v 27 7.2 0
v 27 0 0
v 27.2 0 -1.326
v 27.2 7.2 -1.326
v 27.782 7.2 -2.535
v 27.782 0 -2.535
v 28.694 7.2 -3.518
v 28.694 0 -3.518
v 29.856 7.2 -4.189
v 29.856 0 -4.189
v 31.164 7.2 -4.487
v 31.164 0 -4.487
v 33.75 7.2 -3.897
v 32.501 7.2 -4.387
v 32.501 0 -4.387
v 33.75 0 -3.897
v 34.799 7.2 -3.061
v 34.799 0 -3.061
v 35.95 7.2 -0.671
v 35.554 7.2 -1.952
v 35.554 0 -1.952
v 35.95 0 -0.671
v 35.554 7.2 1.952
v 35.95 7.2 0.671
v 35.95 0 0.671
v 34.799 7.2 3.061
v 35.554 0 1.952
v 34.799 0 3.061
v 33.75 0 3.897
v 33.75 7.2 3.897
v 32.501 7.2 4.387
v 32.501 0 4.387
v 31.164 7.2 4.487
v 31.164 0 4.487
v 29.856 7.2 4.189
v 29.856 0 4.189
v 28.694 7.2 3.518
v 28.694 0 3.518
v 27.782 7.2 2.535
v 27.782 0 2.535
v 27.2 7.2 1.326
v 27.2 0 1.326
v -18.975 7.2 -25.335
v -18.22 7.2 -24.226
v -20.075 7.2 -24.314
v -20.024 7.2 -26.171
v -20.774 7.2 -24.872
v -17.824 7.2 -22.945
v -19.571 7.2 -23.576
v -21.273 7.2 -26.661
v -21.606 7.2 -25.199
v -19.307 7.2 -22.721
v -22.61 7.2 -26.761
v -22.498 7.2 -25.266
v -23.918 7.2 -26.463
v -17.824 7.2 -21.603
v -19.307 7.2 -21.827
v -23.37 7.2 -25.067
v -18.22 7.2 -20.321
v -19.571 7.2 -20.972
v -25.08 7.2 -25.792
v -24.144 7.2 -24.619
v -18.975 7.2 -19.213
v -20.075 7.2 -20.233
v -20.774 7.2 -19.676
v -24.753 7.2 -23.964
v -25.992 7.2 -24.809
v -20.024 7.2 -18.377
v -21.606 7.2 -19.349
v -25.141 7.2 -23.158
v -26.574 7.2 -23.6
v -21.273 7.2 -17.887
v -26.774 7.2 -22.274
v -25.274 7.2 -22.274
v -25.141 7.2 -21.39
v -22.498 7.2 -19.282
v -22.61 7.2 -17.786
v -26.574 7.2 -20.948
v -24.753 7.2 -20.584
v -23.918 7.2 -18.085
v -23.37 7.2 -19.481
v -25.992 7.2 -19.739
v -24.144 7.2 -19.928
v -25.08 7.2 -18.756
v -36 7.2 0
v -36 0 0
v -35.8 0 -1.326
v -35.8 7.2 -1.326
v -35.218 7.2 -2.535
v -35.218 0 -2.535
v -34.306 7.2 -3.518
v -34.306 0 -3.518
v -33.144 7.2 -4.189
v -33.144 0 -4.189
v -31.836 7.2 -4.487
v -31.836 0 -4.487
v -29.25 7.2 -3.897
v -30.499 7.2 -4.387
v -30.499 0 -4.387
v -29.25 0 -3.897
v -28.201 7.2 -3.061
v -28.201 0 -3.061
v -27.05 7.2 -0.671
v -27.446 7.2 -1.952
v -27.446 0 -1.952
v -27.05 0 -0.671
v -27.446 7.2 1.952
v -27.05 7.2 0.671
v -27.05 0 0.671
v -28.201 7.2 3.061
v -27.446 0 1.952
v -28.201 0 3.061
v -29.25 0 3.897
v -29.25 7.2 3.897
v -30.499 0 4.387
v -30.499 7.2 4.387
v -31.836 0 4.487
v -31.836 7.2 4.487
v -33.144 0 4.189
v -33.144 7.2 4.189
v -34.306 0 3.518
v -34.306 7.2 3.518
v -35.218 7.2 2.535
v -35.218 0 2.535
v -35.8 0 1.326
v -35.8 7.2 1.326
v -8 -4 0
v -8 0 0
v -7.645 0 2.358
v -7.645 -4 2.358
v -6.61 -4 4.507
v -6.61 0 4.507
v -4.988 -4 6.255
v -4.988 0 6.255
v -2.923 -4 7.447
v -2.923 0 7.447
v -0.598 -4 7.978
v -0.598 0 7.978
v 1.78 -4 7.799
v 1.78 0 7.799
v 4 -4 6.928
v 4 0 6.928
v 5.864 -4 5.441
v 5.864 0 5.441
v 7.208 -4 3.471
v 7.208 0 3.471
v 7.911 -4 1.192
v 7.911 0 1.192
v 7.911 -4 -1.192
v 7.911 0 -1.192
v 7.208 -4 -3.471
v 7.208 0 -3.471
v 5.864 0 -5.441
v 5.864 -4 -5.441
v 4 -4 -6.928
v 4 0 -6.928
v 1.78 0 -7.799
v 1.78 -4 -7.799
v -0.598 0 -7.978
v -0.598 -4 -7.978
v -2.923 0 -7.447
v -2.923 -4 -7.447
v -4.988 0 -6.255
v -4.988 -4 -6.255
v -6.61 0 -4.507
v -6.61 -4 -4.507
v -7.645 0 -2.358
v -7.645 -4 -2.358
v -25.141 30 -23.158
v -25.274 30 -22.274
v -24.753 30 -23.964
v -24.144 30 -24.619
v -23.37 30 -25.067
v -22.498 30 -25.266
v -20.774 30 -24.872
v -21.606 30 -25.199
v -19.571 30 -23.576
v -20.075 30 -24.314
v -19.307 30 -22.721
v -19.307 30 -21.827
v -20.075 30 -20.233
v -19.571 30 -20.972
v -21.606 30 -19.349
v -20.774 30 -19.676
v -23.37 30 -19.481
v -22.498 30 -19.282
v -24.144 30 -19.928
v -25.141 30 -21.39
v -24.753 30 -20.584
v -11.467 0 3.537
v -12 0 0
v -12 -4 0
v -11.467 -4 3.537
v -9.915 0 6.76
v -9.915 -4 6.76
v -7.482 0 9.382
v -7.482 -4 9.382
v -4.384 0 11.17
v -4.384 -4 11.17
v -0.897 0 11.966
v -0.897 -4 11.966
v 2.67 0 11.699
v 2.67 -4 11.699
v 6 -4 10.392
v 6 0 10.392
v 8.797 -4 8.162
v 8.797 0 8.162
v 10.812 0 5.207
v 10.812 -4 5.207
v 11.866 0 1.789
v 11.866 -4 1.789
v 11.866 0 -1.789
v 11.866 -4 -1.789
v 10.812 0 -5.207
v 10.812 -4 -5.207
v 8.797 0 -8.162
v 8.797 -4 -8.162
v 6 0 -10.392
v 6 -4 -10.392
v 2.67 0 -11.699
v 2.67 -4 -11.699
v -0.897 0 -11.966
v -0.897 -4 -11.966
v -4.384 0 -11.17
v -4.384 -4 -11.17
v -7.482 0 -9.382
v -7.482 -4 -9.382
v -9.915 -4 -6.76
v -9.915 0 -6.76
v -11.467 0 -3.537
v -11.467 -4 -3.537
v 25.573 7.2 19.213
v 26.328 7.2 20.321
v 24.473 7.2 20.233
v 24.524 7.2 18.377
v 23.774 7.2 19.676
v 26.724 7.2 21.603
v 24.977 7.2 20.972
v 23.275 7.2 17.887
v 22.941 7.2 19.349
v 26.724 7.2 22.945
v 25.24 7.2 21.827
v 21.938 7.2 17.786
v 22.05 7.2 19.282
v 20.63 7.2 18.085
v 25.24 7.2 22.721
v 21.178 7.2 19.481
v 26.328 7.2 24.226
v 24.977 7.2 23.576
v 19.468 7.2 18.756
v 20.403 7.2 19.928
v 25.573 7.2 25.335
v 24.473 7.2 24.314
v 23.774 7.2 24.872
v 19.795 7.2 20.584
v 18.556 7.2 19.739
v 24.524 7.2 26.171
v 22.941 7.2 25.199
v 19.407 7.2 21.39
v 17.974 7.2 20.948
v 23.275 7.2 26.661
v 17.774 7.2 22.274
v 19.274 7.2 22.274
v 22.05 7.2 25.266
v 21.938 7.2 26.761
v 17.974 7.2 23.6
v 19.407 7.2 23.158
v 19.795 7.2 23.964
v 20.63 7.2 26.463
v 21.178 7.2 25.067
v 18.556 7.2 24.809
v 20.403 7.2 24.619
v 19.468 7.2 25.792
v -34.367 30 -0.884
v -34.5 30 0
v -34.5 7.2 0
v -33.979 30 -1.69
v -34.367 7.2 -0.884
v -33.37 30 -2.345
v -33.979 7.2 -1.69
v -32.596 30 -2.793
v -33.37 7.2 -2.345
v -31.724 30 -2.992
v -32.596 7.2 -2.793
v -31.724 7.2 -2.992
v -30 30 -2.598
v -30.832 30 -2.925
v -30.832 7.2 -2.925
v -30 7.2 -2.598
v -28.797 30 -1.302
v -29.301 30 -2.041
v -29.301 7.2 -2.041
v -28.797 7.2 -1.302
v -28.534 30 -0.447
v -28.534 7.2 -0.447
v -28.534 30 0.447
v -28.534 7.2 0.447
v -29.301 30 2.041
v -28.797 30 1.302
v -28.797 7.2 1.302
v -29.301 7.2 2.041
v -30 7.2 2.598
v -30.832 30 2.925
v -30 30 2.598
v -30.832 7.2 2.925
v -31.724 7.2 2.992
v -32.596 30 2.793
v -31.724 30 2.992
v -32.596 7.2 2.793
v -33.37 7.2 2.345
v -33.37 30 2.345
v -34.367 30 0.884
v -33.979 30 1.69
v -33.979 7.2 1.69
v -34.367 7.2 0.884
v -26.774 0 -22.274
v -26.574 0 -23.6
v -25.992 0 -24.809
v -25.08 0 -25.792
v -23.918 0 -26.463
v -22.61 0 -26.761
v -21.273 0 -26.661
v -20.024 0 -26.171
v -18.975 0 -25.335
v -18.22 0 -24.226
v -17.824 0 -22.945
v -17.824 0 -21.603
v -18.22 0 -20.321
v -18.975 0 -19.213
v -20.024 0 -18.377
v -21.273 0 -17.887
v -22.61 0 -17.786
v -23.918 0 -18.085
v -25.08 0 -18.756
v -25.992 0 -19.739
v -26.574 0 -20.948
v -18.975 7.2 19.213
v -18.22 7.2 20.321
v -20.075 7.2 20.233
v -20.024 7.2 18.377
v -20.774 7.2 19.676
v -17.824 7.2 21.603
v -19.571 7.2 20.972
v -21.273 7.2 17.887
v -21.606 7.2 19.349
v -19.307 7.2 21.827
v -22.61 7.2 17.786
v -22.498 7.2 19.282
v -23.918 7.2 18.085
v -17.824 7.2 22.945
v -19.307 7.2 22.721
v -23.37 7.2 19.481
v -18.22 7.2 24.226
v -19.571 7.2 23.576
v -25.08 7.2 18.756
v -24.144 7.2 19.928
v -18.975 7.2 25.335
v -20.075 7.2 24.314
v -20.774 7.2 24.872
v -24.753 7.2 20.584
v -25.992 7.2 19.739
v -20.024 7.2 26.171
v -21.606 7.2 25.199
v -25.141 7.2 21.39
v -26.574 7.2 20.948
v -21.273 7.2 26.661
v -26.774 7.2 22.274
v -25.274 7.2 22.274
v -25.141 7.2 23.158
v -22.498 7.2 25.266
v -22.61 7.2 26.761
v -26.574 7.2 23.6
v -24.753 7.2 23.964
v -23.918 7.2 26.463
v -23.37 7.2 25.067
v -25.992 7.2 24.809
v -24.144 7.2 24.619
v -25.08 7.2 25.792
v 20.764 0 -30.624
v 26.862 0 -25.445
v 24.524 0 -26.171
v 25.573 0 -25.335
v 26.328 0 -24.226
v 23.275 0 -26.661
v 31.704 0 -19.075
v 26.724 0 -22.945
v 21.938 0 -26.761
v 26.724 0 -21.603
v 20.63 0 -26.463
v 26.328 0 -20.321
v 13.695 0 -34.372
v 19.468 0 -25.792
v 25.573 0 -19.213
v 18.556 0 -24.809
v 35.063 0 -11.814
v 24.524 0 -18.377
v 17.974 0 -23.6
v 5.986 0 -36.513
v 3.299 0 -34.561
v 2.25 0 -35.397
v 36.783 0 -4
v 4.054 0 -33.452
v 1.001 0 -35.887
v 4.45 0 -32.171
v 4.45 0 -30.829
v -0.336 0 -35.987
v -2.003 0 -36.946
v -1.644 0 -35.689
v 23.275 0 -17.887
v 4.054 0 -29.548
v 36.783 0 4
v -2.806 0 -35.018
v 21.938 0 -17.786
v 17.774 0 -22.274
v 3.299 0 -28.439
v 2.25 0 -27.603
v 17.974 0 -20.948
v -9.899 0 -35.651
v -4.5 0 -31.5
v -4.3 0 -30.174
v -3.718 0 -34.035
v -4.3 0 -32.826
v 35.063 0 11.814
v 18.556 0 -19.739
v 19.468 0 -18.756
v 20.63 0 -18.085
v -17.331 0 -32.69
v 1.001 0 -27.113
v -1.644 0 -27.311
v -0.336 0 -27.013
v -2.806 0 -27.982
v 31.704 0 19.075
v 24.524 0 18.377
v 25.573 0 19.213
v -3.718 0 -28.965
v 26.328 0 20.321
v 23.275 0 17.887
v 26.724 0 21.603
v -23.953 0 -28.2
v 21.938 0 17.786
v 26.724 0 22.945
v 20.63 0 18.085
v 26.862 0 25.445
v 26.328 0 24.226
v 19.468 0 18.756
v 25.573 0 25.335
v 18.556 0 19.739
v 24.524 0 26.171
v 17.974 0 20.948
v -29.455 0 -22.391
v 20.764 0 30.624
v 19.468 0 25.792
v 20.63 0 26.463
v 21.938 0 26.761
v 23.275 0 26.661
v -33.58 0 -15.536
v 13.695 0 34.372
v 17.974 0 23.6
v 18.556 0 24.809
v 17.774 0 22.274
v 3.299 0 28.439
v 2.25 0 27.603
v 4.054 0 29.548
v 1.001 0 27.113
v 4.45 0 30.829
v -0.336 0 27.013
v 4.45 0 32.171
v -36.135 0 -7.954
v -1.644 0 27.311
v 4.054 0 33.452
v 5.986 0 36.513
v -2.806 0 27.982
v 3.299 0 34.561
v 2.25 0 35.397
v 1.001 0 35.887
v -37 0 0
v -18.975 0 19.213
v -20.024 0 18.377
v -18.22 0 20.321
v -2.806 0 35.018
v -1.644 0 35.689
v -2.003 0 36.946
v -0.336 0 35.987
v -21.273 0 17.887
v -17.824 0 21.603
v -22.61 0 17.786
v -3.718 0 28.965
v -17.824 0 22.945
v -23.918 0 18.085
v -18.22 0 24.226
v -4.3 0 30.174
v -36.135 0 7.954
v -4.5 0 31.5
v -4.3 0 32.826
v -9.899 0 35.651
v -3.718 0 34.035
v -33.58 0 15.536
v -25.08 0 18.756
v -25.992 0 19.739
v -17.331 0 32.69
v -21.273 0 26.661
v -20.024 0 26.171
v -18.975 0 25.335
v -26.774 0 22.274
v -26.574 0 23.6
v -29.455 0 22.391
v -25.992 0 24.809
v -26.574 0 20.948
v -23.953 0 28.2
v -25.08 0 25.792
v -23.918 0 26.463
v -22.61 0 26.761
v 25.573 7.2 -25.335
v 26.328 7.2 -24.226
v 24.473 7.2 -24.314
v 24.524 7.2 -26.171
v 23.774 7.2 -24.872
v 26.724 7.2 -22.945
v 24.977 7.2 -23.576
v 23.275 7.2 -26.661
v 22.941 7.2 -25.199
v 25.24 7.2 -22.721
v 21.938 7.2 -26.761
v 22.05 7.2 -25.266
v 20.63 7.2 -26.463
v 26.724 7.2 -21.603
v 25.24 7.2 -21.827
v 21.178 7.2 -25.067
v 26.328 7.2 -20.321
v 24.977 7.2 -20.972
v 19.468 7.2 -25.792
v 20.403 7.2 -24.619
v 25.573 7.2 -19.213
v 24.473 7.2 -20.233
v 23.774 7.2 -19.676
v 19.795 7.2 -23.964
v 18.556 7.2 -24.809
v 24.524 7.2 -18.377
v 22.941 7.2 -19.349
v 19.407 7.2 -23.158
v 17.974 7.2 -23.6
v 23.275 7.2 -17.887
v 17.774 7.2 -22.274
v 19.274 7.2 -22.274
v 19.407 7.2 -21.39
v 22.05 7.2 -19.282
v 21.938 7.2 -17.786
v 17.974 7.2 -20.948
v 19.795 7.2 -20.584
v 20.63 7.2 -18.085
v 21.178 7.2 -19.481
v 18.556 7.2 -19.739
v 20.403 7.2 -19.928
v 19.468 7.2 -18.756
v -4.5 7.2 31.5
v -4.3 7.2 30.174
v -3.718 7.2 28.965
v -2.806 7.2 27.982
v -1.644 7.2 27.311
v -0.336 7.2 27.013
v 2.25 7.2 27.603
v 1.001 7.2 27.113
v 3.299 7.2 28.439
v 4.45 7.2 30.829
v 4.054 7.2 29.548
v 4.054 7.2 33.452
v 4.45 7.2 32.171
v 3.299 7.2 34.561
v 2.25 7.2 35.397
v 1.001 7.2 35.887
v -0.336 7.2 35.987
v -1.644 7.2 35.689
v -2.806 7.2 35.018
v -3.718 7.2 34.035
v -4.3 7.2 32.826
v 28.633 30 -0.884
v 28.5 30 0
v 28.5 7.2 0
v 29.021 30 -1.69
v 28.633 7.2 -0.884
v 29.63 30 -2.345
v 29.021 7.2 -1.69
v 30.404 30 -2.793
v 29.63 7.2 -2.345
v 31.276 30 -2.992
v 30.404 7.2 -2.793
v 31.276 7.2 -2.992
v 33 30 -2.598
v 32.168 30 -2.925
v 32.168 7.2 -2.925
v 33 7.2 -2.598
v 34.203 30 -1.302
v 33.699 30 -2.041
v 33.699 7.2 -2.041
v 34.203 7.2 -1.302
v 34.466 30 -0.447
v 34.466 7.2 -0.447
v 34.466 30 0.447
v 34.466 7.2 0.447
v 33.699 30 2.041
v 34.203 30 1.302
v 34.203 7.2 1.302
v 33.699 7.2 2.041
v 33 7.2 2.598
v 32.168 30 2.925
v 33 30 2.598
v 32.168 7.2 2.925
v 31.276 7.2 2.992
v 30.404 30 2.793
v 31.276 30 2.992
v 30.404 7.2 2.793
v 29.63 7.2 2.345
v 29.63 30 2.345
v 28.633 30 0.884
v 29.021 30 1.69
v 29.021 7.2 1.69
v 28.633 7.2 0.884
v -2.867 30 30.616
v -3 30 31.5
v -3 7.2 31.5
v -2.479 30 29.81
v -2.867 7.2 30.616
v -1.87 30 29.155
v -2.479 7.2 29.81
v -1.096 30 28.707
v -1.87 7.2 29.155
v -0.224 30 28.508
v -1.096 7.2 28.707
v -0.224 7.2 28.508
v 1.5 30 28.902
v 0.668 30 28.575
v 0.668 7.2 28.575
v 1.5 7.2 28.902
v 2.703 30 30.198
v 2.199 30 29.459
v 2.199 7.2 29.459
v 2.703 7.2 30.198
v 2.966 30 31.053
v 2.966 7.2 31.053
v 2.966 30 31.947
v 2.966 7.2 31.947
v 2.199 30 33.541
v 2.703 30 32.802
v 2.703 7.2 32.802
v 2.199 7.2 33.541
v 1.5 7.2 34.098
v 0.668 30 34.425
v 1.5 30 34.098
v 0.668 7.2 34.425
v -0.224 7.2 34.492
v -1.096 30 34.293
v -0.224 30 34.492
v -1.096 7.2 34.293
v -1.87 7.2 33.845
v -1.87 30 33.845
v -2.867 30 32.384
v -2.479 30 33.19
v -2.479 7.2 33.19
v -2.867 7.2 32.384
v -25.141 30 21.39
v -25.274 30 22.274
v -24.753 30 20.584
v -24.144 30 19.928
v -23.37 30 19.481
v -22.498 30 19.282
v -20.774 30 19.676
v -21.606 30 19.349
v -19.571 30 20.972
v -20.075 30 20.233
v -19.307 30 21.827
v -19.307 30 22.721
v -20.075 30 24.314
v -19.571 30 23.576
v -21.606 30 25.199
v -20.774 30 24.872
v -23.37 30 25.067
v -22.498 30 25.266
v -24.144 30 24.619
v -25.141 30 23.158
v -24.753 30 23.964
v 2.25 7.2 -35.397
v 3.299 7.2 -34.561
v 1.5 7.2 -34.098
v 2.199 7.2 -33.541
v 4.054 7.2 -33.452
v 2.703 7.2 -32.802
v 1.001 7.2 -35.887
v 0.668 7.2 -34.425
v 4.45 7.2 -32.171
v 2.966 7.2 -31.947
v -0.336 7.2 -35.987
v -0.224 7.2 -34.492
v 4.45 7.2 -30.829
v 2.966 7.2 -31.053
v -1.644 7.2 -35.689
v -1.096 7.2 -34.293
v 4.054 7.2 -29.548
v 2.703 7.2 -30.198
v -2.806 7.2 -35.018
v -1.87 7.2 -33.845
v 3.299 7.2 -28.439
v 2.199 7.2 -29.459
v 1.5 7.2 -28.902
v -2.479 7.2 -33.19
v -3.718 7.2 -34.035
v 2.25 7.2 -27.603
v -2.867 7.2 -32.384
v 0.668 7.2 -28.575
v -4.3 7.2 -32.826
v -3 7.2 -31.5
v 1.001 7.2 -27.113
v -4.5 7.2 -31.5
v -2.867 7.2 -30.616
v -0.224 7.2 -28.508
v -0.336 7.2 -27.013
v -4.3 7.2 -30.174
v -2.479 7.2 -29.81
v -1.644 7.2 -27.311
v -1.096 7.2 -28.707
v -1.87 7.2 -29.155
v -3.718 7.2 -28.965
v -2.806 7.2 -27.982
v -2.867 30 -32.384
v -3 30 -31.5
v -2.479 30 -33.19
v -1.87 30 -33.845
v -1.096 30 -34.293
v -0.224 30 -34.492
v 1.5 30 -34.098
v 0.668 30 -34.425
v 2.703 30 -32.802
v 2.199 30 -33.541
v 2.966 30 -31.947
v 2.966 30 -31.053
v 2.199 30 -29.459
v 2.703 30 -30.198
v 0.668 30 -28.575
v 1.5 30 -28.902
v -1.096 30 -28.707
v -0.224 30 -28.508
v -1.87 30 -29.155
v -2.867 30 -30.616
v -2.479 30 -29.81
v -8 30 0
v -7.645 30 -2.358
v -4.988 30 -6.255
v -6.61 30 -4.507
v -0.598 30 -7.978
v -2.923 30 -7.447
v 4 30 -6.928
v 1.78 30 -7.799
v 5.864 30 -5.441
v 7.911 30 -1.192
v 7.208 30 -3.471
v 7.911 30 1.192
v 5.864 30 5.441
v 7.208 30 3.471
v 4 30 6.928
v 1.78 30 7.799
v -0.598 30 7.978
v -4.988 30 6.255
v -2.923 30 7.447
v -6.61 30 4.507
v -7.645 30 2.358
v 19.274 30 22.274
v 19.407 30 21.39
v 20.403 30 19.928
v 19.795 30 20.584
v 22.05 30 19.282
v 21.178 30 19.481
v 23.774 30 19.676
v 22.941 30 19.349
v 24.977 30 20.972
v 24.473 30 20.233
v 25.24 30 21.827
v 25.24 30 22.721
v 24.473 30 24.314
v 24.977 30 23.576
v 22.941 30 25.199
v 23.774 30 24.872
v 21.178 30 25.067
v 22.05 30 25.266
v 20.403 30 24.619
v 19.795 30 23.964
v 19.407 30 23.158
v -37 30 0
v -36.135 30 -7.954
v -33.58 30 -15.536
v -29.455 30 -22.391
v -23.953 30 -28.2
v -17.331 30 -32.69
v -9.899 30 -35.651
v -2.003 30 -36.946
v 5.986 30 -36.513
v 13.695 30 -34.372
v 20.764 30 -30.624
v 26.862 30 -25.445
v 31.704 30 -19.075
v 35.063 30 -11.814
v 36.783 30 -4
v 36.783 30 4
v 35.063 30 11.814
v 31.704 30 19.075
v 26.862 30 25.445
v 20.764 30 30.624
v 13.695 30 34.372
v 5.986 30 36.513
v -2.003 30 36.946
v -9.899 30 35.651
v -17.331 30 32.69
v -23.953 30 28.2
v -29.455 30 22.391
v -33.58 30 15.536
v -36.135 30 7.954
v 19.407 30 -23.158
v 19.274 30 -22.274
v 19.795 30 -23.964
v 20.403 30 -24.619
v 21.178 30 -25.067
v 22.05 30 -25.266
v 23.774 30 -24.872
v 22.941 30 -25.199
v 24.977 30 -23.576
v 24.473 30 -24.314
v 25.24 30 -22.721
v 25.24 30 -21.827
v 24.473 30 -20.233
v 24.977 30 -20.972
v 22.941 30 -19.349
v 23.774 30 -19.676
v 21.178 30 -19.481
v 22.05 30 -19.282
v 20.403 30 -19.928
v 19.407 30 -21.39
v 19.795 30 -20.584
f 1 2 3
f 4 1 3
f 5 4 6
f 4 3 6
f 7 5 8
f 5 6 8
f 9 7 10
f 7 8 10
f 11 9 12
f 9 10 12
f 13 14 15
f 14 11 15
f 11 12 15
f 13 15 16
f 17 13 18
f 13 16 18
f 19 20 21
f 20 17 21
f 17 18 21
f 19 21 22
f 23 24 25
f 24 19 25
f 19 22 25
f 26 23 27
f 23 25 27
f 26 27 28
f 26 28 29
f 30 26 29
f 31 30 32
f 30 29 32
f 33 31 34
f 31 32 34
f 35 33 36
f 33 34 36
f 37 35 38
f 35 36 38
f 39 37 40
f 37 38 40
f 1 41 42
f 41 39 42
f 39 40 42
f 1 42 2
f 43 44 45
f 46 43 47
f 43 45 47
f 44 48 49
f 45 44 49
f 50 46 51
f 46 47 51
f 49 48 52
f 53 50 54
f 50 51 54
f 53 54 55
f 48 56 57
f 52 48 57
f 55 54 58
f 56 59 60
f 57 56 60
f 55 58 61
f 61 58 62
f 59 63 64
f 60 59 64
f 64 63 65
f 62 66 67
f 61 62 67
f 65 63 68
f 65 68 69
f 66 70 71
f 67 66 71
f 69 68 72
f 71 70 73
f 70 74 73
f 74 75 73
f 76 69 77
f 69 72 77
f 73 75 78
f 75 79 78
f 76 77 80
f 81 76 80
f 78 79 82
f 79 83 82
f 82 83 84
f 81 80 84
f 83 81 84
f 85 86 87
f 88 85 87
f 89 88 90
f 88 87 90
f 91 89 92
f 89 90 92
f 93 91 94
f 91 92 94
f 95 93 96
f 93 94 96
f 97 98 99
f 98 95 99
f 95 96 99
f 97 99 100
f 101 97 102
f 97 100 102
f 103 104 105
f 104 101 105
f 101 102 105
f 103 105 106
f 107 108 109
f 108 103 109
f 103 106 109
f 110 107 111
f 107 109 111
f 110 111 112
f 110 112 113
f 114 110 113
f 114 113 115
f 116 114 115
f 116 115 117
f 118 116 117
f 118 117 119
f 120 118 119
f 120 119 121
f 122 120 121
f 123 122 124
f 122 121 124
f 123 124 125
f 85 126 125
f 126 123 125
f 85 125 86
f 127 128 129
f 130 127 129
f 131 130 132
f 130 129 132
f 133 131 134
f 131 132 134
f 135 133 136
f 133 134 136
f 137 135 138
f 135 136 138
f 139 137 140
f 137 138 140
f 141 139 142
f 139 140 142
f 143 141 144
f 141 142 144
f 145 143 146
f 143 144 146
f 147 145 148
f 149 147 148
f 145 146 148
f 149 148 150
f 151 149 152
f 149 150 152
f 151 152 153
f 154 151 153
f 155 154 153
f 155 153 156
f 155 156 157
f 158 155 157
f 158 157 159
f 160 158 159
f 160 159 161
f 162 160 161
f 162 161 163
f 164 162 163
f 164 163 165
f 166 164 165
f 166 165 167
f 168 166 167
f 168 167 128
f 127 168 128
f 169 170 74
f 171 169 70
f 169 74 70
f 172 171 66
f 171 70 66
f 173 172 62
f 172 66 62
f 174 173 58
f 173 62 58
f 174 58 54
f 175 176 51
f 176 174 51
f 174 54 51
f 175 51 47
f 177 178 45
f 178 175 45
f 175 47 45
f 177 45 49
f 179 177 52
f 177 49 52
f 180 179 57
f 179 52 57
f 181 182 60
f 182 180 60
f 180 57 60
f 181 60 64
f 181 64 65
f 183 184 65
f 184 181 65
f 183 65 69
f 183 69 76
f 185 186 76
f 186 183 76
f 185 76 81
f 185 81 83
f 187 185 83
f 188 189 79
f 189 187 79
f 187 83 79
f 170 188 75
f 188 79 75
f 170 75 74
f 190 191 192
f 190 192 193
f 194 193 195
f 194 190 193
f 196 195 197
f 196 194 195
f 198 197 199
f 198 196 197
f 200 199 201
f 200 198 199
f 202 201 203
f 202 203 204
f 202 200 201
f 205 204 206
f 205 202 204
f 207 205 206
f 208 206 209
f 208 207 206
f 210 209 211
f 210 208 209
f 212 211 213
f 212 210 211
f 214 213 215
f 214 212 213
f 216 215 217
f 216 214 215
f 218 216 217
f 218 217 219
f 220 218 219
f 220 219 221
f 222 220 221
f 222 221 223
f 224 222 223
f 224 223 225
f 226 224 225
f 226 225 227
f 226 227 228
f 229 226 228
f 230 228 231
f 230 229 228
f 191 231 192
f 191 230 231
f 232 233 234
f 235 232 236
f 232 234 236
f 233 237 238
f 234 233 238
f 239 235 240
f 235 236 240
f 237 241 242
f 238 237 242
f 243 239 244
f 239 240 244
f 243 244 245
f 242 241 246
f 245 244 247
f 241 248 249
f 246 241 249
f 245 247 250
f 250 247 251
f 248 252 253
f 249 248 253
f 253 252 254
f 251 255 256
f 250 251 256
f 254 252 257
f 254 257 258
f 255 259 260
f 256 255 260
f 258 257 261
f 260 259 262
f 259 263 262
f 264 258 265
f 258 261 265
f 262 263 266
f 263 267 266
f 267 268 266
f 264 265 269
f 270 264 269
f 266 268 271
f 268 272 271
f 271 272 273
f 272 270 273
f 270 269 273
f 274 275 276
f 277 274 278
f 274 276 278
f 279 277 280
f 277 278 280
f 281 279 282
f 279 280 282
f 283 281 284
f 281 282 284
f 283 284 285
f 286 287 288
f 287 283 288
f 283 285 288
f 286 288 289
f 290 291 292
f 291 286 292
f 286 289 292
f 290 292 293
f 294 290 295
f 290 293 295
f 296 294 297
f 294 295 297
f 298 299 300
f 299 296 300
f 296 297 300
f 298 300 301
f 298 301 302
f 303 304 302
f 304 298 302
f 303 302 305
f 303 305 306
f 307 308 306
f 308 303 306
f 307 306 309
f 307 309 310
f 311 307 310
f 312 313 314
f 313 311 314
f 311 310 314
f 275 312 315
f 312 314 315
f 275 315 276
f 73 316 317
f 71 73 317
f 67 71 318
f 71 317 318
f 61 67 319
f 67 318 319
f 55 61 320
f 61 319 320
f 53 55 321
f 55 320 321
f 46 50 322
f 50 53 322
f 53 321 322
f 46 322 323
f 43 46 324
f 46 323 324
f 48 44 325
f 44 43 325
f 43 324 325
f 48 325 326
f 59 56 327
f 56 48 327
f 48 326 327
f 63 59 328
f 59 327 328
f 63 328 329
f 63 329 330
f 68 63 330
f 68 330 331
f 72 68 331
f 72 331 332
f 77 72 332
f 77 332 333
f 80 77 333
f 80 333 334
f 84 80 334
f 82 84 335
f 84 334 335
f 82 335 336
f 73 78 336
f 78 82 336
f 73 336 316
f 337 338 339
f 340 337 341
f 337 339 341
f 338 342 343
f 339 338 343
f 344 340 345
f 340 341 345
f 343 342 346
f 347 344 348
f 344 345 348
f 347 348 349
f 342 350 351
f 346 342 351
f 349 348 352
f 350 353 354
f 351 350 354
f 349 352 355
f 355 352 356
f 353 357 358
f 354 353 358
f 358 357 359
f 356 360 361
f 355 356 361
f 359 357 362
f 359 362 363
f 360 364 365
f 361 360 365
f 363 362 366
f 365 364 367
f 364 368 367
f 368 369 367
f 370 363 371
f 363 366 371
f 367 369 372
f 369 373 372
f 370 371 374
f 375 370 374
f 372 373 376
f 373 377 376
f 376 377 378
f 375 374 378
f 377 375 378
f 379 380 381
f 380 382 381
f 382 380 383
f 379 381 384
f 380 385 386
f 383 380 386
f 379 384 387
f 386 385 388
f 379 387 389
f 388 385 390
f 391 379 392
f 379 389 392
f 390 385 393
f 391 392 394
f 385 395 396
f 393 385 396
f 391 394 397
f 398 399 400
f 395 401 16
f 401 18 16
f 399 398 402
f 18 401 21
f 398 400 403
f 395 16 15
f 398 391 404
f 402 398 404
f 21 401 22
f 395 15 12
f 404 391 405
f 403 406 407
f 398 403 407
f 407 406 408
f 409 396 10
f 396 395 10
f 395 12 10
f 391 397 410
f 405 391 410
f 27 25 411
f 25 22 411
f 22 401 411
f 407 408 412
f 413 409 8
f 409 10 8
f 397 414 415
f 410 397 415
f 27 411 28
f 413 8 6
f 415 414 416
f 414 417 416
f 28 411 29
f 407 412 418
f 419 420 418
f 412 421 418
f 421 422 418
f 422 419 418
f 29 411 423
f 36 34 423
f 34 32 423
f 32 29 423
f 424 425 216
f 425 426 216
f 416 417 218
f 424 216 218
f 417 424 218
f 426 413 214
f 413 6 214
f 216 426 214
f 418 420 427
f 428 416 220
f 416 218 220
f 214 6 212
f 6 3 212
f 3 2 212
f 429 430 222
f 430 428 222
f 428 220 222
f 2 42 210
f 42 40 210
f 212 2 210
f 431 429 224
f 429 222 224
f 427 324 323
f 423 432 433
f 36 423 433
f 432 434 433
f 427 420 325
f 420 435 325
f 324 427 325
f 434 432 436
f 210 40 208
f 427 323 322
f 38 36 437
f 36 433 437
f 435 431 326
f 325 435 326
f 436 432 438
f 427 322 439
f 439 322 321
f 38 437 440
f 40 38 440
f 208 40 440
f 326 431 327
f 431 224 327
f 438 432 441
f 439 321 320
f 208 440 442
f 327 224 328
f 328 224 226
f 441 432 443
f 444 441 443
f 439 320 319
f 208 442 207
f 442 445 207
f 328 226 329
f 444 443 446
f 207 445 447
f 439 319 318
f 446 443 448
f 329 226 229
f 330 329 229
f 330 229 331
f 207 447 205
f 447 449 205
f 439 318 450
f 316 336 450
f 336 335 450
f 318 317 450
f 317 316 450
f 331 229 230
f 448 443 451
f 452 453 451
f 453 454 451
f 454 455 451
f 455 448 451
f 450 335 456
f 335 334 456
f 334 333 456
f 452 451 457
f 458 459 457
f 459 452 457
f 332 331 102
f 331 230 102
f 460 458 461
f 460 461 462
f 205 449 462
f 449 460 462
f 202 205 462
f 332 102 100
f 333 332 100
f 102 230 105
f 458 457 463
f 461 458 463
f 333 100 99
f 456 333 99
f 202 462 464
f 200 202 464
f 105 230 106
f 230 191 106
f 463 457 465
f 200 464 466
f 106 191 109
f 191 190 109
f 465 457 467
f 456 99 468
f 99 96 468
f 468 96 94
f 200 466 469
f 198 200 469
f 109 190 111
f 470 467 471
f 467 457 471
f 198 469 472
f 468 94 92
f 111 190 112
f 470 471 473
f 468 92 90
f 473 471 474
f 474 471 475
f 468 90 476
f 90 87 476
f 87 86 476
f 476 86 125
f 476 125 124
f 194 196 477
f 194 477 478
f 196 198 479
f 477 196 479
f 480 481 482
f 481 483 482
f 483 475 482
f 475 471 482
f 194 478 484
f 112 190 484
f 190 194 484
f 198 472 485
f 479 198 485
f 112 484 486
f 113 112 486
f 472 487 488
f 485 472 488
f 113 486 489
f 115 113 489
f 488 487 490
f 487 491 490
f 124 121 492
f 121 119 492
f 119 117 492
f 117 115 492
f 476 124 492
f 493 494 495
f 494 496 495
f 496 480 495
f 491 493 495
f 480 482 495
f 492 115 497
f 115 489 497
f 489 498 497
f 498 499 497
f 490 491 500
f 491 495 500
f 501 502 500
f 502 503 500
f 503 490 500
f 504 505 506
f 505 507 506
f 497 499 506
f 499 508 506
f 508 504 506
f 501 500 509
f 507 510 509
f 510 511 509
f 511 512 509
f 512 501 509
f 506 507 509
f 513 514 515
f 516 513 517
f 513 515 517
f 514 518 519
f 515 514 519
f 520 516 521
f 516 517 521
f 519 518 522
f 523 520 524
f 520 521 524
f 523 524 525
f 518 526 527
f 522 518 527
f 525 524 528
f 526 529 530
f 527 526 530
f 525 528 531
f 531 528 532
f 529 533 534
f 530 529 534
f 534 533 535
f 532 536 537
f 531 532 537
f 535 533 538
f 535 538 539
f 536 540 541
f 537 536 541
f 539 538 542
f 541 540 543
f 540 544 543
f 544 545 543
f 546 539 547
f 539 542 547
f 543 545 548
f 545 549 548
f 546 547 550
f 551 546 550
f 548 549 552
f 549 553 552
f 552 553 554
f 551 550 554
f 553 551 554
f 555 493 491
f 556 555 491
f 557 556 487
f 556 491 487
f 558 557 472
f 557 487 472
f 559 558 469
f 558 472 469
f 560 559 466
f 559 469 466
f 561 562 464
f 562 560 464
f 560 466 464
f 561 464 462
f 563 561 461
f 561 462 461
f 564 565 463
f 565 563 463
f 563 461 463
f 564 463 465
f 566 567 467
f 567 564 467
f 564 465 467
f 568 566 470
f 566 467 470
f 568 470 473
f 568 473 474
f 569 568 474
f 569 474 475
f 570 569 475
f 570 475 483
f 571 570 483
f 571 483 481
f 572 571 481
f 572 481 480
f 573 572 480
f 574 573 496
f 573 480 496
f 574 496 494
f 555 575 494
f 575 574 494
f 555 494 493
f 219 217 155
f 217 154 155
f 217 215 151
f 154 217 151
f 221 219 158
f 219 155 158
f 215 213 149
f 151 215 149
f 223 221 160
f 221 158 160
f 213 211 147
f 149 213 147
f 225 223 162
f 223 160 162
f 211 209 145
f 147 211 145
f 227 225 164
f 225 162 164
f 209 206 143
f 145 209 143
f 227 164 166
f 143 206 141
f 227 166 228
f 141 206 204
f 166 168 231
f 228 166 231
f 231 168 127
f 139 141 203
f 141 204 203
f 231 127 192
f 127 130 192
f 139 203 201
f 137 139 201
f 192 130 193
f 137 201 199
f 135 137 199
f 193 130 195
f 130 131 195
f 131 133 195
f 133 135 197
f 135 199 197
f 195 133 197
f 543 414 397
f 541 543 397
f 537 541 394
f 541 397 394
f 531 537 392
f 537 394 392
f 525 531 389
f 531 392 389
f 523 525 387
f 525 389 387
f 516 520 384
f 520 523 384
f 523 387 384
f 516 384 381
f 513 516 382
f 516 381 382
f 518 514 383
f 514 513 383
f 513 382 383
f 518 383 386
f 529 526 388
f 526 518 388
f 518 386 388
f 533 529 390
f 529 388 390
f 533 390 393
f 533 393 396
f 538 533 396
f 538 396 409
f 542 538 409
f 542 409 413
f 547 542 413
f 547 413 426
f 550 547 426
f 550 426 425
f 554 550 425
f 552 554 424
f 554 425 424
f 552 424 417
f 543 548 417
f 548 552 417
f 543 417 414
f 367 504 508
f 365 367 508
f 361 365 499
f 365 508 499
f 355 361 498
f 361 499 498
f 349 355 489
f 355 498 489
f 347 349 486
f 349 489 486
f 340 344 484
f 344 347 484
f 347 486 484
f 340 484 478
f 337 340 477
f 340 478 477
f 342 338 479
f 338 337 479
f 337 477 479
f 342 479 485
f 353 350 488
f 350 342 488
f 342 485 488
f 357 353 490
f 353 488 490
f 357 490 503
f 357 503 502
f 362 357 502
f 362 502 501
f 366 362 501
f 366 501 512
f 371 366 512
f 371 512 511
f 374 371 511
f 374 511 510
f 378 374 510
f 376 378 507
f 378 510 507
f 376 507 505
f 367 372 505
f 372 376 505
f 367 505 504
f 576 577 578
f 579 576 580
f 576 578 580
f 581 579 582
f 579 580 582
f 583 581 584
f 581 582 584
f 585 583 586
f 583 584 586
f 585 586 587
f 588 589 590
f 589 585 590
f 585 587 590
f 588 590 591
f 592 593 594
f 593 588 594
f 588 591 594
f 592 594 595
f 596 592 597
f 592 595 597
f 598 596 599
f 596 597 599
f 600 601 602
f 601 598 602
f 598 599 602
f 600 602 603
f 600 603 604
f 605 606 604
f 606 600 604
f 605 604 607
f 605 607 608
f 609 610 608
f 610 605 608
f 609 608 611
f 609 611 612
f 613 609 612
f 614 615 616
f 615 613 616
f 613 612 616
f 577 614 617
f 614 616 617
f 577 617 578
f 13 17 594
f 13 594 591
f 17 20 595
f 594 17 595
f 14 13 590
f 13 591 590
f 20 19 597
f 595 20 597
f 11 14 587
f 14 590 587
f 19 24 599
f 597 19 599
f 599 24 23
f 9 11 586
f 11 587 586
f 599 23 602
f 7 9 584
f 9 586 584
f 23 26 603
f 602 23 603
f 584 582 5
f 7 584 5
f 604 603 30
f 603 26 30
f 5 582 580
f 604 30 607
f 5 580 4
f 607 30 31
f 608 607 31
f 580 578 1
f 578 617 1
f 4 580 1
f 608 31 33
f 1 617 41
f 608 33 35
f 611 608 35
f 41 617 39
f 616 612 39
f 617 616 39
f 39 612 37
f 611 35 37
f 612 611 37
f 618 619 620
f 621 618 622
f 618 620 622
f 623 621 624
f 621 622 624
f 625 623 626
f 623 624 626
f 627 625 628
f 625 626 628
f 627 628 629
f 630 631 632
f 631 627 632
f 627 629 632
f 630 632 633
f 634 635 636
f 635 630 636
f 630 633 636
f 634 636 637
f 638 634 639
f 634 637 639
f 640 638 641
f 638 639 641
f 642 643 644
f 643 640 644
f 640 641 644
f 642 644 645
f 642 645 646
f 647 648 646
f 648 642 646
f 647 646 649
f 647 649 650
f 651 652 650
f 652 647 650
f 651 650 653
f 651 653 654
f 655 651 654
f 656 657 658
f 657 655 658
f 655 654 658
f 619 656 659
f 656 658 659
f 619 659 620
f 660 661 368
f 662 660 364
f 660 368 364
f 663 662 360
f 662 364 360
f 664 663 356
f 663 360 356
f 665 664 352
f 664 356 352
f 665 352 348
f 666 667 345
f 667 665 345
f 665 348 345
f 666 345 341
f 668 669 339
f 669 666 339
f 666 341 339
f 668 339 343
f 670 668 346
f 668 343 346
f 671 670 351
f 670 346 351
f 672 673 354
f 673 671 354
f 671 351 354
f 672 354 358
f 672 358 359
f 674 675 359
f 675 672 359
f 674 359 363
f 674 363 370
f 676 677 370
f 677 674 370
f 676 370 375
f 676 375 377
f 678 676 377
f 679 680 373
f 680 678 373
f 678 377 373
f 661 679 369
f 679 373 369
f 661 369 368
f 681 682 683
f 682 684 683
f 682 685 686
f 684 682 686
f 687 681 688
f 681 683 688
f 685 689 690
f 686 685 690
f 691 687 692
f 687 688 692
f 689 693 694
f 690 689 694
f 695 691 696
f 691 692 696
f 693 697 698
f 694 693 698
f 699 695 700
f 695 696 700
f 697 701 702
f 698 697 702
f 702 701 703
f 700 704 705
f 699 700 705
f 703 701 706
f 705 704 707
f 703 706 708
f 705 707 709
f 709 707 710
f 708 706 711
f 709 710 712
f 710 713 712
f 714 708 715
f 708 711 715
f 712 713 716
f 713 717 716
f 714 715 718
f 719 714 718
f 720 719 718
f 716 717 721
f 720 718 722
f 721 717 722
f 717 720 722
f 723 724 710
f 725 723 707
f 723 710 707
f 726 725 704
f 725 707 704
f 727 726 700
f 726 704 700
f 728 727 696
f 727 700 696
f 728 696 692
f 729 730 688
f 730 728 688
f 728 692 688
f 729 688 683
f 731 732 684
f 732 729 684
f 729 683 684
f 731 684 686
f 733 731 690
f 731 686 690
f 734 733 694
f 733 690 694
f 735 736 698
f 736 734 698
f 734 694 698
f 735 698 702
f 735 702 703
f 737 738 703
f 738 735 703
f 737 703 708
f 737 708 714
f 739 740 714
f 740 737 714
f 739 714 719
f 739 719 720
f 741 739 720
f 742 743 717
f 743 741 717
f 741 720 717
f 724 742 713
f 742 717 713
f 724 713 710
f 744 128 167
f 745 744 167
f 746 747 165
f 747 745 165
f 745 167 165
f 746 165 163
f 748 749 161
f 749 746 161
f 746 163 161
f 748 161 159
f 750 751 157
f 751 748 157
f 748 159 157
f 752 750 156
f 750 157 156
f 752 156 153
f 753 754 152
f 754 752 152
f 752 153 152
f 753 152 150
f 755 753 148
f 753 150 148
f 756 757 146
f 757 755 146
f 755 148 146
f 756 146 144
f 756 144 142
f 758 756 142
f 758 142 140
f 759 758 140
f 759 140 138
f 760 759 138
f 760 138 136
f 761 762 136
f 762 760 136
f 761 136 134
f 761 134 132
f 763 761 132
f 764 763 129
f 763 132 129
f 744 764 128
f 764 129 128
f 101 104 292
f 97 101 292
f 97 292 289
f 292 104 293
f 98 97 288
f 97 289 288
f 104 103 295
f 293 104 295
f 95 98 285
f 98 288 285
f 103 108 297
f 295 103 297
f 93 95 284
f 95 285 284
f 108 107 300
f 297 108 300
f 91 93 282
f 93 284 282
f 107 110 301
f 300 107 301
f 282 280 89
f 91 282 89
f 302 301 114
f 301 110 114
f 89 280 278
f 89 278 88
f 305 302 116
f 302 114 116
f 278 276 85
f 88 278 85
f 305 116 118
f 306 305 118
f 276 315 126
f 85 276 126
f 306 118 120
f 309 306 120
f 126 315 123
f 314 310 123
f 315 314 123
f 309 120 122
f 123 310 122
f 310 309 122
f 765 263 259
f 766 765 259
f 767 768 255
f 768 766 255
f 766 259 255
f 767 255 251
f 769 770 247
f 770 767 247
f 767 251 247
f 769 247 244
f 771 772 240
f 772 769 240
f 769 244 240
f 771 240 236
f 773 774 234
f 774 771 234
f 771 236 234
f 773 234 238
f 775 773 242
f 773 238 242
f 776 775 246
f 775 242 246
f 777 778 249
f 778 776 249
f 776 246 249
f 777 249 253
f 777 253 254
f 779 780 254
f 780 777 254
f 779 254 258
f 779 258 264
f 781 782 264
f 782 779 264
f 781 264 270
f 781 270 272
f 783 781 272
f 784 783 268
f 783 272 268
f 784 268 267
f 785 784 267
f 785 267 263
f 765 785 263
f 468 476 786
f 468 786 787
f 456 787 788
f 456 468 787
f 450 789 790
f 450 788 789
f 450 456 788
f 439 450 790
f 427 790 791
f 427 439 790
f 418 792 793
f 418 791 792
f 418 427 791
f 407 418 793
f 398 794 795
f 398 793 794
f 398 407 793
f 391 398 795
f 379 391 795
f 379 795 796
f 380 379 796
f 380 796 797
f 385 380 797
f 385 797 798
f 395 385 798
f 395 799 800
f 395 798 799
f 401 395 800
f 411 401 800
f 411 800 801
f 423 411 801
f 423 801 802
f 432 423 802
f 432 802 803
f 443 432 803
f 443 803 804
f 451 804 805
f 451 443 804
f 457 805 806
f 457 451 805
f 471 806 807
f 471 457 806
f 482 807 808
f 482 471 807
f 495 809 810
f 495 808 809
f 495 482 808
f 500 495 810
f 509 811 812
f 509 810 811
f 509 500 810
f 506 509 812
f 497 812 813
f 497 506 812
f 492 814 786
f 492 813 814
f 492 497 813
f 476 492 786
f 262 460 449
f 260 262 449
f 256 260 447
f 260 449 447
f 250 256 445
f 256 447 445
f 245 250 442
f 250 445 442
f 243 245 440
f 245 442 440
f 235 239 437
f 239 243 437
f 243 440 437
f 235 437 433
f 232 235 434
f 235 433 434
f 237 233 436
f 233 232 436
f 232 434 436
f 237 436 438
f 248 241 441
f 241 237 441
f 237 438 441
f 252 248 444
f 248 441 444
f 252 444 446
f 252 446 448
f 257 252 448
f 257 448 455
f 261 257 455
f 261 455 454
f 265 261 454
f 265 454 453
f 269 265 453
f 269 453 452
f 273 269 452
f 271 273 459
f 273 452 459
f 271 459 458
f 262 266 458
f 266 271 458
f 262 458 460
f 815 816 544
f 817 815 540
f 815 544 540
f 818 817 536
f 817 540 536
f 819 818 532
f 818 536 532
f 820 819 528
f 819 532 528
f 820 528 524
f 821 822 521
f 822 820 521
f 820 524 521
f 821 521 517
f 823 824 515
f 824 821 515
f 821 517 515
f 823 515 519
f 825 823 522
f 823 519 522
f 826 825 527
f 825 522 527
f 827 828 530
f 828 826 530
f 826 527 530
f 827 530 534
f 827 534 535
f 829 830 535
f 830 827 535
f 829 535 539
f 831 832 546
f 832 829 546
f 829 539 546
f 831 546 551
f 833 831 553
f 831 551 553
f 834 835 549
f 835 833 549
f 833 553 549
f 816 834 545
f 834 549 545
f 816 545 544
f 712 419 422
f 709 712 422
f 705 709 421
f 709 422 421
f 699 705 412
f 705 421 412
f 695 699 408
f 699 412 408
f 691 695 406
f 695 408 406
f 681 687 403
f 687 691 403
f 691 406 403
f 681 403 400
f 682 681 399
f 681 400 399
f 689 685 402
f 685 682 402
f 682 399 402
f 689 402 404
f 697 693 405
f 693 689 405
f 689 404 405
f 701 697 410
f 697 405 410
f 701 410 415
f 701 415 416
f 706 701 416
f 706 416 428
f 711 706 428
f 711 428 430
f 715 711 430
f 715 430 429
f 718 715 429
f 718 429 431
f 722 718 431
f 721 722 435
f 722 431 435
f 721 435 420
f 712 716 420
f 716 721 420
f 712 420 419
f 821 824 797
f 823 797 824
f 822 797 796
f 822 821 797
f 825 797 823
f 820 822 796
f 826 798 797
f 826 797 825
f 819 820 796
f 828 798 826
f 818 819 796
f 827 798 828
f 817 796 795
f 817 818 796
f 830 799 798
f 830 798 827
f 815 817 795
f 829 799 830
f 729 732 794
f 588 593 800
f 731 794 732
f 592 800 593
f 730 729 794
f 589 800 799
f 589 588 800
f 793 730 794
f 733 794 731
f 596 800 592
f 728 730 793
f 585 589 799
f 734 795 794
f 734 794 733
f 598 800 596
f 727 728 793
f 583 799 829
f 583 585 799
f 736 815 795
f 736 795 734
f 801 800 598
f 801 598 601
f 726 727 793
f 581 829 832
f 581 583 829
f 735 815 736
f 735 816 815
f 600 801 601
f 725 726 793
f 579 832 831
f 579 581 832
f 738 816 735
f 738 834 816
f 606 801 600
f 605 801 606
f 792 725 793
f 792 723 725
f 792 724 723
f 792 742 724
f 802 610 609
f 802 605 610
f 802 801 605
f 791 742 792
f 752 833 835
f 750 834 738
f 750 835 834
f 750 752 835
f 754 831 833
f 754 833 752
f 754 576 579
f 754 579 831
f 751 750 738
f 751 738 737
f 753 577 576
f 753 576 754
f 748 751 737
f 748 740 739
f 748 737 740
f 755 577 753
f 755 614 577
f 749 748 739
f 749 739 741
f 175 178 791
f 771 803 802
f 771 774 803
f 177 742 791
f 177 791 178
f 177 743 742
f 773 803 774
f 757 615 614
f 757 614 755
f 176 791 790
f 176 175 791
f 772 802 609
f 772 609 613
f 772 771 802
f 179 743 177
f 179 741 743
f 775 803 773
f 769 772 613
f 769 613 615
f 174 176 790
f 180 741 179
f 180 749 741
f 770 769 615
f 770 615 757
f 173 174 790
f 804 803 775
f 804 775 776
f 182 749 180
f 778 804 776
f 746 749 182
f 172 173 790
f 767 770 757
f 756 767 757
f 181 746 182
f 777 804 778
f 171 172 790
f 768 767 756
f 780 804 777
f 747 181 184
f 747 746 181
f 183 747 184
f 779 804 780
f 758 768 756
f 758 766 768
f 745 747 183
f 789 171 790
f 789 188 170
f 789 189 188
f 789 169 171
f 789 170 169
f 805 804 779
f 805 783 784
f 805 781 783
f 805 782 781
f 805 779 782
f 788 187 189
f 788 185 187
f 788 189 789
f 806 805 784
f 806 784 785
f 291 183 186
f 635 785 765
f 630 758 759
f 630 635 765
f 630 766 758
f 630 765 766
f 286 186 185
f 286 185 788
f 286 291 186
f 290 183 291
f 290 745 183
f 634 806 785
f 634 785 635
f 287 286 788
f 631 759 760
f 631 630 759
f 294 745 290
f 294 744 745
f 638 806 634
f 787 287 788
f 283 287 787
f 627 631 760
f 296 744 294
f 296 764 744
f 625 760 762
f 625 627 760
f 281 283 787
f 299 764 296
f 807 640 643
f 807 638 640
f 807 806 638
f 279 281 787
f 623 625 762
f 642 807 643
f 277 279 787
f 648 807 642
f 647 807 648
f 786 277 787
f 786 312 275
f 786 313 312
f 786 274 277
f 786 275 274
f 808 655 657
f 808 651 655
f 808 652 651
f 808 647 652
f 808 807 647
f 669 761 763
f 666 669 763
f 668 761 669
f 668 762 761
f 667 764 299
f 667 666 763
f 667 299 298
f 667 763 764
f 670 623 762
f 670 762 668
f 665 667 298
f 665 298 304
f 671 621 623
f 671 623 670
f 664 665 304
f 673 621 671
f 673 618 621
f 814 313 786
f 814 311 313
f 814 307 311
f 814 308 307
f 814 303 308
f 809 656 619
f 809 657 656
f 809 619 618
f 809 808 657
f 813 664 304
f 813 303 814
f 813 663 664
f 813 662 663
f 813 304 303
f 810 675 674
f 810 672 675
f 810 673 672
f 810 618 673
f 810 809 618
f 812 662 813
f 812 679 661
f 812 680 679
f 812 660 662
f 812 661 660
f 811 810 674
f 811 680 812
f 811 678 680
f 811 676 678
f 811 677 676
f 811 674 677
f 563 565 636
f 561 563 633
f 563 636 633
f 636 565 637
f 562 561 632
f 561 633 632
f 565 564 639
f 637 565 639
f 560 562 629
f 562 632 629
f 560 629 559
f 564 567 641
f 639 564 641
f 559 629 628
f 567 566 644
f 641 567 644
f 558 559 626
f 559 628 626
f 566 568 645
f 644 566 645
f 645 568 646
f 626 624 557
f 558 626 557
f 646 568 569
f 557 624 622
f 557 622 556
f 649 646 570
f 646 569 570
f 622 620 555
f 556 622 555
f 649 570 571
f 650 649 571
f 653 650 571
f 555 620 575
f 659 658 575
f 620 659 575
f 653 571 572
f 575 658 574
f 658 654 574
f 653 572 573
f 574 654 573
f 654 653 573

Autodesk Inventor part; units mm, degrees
ref_plane "YZ Plane" through (0, 0, 0) normal (1, 0, 0) x (0, 1, 0)
ref_plane "XZ Plane" through (0, 0, 0) normal (0, 1, 0) x (-1, 0, 0)
ref_plane "XY Plane" through (0, 0, 0) normal (0, 0, 1) x (1, 0, 0)
sketch "Sketch1" plane through (0, 0, 0) normal (0, 1, 0) x (-1, 0, 0)
  circle A0 centre (0, 0) radius 37
  circle A1 centre (0, 0) radius 12
  circle A2 centre (0, 0) radius 8
  circle A3 centre (0, 0) radius 31.5 construction
  circle A4 centre (31.5, 0) radius 3
  circle A5 centre (31.5, 0) radius 4.5
  circle A6 centre (22.2739, 22.2739) radius 3
  circle A7 centre (22.2739, 22.2739) radius 4.5
  circle A8 centre (0, 31.5) radius 3
  circle A9 centre (0, 31.5) radius 4.5
  circle A10 centre (-22.2739, 22.2739) radius 3
  circle A11 centre (-22.2739, 22.2739) radius 4.5
  circle A12 centre (-31.5, 0) radius 3
  circle A13 centre (-31.5, 0) radius 4.5
  circle A14 centre (-22.2739, -22.2739) radius 3
  circle A15 centre (-22.2739, -22.2739) radius 4.5
  circle A16 centre (0, -31.5) radius 3
  circle A17 centre (0, -31.5) radius 4.5
  circle A18 centre (22.2739, -22.2739) radius 3
  circle A19 centre (22.2739, -22.2739) radius 4.5
  dimension "d3" = 63
  dimension "d0" = 74
  dimension "d1" = 24
  dimension "d2" = 16
  dimension "d4" = 6
  dimension "d5" = 9
  dimension "d8" = 360
extrude "Extrusion1" add sketch "Sketch1" along normal blind 30 contours A0 | A1 | A5 | A7 | A9 | A11 | A13 | A15 | A17 | A19
extrude "Extrusion2" cut sketch "Sketch1" along normal blind 7.2 contours A4 | A5 | A6 | A7 | A8 | A9 | A11 | A12 | A13 | A14 | A15 | A16 | A17 | A18 | A19
extrude "Extrusion3" add sketch "Sketch1" against normal blind 4 contours A1
properties part number "LoadCell" material "Stainless Steel"
